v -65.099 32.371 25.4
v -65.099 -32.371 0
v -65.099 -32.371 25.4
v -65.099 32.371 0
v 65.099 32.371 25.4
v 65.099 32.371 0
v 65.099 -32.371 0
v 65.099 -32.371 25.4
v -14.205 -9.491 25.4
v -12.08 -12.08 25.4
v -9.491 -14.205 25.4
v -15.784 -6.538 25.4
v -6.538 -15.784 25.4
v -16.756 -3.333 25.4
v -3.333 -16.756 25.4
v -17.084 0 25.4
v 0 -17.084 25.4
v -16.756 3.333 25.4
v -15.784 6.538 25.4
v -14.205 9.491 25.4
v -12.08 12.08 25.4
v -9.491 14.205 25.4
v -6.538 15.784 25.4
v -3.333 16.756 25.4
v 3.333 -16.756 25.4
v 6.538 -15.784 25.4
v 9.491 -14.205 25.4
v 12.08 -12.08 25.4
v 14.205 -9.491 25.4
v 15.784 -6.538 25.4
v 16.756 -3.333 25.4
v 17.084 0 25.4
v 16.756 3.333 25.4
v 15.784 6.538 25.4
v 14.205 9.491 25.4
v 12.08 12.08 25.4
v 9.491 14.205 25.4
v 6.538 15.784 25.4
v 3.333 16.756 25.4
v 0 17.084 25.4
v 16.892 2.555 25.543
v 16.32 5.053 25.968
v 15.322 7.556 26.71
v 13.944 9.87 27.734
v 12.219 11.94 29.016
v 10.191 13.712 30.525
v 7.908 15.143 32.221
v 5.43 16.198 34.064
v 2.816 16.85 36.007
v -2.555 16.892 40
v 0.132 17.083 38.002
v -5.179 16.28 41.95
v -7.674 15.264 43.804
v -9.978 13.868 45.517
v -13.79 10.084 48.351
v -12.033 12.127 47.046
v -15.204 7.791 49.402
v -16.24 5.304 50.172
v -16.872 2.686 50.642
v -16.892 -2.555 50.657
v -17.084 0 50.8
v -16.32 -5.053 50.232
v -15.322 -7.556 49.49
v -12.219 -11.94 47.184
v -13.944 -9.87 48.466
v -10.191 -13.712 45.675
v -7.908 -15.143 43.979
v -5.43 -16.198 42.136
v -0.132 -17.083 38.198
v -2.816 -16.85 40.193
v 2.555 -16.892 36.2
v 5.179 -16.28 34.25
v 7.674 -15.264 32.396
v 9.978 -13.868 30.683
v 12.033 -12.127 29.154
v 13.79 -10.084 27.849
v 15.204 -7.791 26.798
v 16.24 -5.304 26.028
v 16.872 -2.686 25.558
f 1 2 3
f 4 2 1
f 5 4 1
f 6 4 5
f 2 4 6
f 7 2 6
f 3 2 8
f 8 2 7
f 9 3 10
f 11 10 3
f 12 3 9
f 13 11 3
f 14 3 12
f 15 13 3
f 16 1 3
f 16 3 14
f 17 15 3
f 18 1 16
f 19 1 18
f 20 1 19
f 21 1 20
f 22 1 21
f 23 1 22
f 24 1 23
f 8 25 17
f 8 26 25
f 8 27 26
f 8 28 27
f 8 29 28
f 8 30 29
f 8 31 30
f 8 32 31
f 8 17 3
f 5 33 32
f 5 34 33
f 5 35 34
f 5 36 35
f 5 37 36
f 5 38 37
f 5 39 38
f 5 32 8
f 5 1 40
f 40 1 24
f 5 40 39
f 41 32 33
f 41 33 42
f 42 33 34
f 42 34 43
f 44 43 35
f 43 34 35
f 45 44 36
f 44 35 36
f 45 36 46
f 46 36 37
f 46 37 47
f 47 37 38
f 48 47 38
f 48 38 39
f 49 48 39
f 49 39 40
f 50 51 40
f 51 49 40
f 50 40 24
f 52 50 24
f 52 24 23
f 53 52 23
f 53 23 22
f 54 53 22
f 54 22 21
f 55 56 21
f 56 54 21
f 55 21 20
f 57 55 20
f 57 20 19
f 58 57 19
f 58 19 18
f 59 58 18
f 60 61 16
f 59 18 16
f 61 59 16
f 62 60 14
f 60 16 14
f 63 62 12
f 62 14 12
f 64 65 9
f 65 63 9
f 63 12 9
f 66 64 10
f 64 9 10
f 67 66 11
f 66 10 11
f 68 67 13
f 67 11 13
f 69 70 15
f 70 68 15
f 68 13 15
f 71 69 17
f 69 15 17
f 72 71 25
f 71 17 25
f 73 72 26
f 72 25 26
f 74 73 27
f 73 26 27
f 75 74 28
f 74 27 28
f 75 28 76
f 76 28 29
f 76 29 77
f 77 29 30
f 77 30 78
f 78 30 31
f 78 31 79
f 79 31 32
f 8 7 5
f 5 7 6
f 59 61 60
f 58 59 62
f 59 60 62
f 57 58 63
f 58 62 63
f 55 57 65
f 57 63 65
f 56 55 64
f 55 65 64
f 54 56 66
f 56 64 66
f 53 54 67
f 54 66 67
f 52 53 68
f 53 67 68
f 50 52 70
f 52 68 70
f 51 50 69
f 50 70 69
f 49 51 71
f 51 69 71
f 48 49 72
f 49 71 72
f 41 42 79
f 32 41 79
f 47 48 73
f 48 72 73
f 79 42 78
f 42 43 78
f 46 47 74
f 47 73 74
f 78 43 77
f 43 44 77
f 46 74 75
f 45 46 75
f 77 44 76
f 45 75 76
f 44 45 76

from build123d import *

# Parameters (mm, degrees)
F0_W     = 130.198062
F0_H     = 64.74135
F1_DEPTH = 25.4
F3_R     = 17.084004
F4_DEPTH = 25.4
F6_DEPTH = 56.896


with BuildPart() as f1:
    # F0 (on Top) → F1 (new body)
    with BuildSketch(Plane.XY):
        Rectangle(F0_W, F0_H)
    extrude(amount=F1_DEPTH)

    # F3 (on face) → F4 (join)
    with BuildSketch(Plane.XY.offset(25.4)):
        Circle(F3_R)
    extrude(amount=F4_DEPTH)

    # F5 (on Front) → F6 (cut, symmetric)
    with BuildSketch(Plane.XZ):
        Polygon((17.084004, 50.8), (-17.084004, 50.8), (17.084004, 25.4), align=None)
    extrude(amount=F6_DEPTH, both=True, mode=Mode.SUBTRACT)


solid = f1.part
